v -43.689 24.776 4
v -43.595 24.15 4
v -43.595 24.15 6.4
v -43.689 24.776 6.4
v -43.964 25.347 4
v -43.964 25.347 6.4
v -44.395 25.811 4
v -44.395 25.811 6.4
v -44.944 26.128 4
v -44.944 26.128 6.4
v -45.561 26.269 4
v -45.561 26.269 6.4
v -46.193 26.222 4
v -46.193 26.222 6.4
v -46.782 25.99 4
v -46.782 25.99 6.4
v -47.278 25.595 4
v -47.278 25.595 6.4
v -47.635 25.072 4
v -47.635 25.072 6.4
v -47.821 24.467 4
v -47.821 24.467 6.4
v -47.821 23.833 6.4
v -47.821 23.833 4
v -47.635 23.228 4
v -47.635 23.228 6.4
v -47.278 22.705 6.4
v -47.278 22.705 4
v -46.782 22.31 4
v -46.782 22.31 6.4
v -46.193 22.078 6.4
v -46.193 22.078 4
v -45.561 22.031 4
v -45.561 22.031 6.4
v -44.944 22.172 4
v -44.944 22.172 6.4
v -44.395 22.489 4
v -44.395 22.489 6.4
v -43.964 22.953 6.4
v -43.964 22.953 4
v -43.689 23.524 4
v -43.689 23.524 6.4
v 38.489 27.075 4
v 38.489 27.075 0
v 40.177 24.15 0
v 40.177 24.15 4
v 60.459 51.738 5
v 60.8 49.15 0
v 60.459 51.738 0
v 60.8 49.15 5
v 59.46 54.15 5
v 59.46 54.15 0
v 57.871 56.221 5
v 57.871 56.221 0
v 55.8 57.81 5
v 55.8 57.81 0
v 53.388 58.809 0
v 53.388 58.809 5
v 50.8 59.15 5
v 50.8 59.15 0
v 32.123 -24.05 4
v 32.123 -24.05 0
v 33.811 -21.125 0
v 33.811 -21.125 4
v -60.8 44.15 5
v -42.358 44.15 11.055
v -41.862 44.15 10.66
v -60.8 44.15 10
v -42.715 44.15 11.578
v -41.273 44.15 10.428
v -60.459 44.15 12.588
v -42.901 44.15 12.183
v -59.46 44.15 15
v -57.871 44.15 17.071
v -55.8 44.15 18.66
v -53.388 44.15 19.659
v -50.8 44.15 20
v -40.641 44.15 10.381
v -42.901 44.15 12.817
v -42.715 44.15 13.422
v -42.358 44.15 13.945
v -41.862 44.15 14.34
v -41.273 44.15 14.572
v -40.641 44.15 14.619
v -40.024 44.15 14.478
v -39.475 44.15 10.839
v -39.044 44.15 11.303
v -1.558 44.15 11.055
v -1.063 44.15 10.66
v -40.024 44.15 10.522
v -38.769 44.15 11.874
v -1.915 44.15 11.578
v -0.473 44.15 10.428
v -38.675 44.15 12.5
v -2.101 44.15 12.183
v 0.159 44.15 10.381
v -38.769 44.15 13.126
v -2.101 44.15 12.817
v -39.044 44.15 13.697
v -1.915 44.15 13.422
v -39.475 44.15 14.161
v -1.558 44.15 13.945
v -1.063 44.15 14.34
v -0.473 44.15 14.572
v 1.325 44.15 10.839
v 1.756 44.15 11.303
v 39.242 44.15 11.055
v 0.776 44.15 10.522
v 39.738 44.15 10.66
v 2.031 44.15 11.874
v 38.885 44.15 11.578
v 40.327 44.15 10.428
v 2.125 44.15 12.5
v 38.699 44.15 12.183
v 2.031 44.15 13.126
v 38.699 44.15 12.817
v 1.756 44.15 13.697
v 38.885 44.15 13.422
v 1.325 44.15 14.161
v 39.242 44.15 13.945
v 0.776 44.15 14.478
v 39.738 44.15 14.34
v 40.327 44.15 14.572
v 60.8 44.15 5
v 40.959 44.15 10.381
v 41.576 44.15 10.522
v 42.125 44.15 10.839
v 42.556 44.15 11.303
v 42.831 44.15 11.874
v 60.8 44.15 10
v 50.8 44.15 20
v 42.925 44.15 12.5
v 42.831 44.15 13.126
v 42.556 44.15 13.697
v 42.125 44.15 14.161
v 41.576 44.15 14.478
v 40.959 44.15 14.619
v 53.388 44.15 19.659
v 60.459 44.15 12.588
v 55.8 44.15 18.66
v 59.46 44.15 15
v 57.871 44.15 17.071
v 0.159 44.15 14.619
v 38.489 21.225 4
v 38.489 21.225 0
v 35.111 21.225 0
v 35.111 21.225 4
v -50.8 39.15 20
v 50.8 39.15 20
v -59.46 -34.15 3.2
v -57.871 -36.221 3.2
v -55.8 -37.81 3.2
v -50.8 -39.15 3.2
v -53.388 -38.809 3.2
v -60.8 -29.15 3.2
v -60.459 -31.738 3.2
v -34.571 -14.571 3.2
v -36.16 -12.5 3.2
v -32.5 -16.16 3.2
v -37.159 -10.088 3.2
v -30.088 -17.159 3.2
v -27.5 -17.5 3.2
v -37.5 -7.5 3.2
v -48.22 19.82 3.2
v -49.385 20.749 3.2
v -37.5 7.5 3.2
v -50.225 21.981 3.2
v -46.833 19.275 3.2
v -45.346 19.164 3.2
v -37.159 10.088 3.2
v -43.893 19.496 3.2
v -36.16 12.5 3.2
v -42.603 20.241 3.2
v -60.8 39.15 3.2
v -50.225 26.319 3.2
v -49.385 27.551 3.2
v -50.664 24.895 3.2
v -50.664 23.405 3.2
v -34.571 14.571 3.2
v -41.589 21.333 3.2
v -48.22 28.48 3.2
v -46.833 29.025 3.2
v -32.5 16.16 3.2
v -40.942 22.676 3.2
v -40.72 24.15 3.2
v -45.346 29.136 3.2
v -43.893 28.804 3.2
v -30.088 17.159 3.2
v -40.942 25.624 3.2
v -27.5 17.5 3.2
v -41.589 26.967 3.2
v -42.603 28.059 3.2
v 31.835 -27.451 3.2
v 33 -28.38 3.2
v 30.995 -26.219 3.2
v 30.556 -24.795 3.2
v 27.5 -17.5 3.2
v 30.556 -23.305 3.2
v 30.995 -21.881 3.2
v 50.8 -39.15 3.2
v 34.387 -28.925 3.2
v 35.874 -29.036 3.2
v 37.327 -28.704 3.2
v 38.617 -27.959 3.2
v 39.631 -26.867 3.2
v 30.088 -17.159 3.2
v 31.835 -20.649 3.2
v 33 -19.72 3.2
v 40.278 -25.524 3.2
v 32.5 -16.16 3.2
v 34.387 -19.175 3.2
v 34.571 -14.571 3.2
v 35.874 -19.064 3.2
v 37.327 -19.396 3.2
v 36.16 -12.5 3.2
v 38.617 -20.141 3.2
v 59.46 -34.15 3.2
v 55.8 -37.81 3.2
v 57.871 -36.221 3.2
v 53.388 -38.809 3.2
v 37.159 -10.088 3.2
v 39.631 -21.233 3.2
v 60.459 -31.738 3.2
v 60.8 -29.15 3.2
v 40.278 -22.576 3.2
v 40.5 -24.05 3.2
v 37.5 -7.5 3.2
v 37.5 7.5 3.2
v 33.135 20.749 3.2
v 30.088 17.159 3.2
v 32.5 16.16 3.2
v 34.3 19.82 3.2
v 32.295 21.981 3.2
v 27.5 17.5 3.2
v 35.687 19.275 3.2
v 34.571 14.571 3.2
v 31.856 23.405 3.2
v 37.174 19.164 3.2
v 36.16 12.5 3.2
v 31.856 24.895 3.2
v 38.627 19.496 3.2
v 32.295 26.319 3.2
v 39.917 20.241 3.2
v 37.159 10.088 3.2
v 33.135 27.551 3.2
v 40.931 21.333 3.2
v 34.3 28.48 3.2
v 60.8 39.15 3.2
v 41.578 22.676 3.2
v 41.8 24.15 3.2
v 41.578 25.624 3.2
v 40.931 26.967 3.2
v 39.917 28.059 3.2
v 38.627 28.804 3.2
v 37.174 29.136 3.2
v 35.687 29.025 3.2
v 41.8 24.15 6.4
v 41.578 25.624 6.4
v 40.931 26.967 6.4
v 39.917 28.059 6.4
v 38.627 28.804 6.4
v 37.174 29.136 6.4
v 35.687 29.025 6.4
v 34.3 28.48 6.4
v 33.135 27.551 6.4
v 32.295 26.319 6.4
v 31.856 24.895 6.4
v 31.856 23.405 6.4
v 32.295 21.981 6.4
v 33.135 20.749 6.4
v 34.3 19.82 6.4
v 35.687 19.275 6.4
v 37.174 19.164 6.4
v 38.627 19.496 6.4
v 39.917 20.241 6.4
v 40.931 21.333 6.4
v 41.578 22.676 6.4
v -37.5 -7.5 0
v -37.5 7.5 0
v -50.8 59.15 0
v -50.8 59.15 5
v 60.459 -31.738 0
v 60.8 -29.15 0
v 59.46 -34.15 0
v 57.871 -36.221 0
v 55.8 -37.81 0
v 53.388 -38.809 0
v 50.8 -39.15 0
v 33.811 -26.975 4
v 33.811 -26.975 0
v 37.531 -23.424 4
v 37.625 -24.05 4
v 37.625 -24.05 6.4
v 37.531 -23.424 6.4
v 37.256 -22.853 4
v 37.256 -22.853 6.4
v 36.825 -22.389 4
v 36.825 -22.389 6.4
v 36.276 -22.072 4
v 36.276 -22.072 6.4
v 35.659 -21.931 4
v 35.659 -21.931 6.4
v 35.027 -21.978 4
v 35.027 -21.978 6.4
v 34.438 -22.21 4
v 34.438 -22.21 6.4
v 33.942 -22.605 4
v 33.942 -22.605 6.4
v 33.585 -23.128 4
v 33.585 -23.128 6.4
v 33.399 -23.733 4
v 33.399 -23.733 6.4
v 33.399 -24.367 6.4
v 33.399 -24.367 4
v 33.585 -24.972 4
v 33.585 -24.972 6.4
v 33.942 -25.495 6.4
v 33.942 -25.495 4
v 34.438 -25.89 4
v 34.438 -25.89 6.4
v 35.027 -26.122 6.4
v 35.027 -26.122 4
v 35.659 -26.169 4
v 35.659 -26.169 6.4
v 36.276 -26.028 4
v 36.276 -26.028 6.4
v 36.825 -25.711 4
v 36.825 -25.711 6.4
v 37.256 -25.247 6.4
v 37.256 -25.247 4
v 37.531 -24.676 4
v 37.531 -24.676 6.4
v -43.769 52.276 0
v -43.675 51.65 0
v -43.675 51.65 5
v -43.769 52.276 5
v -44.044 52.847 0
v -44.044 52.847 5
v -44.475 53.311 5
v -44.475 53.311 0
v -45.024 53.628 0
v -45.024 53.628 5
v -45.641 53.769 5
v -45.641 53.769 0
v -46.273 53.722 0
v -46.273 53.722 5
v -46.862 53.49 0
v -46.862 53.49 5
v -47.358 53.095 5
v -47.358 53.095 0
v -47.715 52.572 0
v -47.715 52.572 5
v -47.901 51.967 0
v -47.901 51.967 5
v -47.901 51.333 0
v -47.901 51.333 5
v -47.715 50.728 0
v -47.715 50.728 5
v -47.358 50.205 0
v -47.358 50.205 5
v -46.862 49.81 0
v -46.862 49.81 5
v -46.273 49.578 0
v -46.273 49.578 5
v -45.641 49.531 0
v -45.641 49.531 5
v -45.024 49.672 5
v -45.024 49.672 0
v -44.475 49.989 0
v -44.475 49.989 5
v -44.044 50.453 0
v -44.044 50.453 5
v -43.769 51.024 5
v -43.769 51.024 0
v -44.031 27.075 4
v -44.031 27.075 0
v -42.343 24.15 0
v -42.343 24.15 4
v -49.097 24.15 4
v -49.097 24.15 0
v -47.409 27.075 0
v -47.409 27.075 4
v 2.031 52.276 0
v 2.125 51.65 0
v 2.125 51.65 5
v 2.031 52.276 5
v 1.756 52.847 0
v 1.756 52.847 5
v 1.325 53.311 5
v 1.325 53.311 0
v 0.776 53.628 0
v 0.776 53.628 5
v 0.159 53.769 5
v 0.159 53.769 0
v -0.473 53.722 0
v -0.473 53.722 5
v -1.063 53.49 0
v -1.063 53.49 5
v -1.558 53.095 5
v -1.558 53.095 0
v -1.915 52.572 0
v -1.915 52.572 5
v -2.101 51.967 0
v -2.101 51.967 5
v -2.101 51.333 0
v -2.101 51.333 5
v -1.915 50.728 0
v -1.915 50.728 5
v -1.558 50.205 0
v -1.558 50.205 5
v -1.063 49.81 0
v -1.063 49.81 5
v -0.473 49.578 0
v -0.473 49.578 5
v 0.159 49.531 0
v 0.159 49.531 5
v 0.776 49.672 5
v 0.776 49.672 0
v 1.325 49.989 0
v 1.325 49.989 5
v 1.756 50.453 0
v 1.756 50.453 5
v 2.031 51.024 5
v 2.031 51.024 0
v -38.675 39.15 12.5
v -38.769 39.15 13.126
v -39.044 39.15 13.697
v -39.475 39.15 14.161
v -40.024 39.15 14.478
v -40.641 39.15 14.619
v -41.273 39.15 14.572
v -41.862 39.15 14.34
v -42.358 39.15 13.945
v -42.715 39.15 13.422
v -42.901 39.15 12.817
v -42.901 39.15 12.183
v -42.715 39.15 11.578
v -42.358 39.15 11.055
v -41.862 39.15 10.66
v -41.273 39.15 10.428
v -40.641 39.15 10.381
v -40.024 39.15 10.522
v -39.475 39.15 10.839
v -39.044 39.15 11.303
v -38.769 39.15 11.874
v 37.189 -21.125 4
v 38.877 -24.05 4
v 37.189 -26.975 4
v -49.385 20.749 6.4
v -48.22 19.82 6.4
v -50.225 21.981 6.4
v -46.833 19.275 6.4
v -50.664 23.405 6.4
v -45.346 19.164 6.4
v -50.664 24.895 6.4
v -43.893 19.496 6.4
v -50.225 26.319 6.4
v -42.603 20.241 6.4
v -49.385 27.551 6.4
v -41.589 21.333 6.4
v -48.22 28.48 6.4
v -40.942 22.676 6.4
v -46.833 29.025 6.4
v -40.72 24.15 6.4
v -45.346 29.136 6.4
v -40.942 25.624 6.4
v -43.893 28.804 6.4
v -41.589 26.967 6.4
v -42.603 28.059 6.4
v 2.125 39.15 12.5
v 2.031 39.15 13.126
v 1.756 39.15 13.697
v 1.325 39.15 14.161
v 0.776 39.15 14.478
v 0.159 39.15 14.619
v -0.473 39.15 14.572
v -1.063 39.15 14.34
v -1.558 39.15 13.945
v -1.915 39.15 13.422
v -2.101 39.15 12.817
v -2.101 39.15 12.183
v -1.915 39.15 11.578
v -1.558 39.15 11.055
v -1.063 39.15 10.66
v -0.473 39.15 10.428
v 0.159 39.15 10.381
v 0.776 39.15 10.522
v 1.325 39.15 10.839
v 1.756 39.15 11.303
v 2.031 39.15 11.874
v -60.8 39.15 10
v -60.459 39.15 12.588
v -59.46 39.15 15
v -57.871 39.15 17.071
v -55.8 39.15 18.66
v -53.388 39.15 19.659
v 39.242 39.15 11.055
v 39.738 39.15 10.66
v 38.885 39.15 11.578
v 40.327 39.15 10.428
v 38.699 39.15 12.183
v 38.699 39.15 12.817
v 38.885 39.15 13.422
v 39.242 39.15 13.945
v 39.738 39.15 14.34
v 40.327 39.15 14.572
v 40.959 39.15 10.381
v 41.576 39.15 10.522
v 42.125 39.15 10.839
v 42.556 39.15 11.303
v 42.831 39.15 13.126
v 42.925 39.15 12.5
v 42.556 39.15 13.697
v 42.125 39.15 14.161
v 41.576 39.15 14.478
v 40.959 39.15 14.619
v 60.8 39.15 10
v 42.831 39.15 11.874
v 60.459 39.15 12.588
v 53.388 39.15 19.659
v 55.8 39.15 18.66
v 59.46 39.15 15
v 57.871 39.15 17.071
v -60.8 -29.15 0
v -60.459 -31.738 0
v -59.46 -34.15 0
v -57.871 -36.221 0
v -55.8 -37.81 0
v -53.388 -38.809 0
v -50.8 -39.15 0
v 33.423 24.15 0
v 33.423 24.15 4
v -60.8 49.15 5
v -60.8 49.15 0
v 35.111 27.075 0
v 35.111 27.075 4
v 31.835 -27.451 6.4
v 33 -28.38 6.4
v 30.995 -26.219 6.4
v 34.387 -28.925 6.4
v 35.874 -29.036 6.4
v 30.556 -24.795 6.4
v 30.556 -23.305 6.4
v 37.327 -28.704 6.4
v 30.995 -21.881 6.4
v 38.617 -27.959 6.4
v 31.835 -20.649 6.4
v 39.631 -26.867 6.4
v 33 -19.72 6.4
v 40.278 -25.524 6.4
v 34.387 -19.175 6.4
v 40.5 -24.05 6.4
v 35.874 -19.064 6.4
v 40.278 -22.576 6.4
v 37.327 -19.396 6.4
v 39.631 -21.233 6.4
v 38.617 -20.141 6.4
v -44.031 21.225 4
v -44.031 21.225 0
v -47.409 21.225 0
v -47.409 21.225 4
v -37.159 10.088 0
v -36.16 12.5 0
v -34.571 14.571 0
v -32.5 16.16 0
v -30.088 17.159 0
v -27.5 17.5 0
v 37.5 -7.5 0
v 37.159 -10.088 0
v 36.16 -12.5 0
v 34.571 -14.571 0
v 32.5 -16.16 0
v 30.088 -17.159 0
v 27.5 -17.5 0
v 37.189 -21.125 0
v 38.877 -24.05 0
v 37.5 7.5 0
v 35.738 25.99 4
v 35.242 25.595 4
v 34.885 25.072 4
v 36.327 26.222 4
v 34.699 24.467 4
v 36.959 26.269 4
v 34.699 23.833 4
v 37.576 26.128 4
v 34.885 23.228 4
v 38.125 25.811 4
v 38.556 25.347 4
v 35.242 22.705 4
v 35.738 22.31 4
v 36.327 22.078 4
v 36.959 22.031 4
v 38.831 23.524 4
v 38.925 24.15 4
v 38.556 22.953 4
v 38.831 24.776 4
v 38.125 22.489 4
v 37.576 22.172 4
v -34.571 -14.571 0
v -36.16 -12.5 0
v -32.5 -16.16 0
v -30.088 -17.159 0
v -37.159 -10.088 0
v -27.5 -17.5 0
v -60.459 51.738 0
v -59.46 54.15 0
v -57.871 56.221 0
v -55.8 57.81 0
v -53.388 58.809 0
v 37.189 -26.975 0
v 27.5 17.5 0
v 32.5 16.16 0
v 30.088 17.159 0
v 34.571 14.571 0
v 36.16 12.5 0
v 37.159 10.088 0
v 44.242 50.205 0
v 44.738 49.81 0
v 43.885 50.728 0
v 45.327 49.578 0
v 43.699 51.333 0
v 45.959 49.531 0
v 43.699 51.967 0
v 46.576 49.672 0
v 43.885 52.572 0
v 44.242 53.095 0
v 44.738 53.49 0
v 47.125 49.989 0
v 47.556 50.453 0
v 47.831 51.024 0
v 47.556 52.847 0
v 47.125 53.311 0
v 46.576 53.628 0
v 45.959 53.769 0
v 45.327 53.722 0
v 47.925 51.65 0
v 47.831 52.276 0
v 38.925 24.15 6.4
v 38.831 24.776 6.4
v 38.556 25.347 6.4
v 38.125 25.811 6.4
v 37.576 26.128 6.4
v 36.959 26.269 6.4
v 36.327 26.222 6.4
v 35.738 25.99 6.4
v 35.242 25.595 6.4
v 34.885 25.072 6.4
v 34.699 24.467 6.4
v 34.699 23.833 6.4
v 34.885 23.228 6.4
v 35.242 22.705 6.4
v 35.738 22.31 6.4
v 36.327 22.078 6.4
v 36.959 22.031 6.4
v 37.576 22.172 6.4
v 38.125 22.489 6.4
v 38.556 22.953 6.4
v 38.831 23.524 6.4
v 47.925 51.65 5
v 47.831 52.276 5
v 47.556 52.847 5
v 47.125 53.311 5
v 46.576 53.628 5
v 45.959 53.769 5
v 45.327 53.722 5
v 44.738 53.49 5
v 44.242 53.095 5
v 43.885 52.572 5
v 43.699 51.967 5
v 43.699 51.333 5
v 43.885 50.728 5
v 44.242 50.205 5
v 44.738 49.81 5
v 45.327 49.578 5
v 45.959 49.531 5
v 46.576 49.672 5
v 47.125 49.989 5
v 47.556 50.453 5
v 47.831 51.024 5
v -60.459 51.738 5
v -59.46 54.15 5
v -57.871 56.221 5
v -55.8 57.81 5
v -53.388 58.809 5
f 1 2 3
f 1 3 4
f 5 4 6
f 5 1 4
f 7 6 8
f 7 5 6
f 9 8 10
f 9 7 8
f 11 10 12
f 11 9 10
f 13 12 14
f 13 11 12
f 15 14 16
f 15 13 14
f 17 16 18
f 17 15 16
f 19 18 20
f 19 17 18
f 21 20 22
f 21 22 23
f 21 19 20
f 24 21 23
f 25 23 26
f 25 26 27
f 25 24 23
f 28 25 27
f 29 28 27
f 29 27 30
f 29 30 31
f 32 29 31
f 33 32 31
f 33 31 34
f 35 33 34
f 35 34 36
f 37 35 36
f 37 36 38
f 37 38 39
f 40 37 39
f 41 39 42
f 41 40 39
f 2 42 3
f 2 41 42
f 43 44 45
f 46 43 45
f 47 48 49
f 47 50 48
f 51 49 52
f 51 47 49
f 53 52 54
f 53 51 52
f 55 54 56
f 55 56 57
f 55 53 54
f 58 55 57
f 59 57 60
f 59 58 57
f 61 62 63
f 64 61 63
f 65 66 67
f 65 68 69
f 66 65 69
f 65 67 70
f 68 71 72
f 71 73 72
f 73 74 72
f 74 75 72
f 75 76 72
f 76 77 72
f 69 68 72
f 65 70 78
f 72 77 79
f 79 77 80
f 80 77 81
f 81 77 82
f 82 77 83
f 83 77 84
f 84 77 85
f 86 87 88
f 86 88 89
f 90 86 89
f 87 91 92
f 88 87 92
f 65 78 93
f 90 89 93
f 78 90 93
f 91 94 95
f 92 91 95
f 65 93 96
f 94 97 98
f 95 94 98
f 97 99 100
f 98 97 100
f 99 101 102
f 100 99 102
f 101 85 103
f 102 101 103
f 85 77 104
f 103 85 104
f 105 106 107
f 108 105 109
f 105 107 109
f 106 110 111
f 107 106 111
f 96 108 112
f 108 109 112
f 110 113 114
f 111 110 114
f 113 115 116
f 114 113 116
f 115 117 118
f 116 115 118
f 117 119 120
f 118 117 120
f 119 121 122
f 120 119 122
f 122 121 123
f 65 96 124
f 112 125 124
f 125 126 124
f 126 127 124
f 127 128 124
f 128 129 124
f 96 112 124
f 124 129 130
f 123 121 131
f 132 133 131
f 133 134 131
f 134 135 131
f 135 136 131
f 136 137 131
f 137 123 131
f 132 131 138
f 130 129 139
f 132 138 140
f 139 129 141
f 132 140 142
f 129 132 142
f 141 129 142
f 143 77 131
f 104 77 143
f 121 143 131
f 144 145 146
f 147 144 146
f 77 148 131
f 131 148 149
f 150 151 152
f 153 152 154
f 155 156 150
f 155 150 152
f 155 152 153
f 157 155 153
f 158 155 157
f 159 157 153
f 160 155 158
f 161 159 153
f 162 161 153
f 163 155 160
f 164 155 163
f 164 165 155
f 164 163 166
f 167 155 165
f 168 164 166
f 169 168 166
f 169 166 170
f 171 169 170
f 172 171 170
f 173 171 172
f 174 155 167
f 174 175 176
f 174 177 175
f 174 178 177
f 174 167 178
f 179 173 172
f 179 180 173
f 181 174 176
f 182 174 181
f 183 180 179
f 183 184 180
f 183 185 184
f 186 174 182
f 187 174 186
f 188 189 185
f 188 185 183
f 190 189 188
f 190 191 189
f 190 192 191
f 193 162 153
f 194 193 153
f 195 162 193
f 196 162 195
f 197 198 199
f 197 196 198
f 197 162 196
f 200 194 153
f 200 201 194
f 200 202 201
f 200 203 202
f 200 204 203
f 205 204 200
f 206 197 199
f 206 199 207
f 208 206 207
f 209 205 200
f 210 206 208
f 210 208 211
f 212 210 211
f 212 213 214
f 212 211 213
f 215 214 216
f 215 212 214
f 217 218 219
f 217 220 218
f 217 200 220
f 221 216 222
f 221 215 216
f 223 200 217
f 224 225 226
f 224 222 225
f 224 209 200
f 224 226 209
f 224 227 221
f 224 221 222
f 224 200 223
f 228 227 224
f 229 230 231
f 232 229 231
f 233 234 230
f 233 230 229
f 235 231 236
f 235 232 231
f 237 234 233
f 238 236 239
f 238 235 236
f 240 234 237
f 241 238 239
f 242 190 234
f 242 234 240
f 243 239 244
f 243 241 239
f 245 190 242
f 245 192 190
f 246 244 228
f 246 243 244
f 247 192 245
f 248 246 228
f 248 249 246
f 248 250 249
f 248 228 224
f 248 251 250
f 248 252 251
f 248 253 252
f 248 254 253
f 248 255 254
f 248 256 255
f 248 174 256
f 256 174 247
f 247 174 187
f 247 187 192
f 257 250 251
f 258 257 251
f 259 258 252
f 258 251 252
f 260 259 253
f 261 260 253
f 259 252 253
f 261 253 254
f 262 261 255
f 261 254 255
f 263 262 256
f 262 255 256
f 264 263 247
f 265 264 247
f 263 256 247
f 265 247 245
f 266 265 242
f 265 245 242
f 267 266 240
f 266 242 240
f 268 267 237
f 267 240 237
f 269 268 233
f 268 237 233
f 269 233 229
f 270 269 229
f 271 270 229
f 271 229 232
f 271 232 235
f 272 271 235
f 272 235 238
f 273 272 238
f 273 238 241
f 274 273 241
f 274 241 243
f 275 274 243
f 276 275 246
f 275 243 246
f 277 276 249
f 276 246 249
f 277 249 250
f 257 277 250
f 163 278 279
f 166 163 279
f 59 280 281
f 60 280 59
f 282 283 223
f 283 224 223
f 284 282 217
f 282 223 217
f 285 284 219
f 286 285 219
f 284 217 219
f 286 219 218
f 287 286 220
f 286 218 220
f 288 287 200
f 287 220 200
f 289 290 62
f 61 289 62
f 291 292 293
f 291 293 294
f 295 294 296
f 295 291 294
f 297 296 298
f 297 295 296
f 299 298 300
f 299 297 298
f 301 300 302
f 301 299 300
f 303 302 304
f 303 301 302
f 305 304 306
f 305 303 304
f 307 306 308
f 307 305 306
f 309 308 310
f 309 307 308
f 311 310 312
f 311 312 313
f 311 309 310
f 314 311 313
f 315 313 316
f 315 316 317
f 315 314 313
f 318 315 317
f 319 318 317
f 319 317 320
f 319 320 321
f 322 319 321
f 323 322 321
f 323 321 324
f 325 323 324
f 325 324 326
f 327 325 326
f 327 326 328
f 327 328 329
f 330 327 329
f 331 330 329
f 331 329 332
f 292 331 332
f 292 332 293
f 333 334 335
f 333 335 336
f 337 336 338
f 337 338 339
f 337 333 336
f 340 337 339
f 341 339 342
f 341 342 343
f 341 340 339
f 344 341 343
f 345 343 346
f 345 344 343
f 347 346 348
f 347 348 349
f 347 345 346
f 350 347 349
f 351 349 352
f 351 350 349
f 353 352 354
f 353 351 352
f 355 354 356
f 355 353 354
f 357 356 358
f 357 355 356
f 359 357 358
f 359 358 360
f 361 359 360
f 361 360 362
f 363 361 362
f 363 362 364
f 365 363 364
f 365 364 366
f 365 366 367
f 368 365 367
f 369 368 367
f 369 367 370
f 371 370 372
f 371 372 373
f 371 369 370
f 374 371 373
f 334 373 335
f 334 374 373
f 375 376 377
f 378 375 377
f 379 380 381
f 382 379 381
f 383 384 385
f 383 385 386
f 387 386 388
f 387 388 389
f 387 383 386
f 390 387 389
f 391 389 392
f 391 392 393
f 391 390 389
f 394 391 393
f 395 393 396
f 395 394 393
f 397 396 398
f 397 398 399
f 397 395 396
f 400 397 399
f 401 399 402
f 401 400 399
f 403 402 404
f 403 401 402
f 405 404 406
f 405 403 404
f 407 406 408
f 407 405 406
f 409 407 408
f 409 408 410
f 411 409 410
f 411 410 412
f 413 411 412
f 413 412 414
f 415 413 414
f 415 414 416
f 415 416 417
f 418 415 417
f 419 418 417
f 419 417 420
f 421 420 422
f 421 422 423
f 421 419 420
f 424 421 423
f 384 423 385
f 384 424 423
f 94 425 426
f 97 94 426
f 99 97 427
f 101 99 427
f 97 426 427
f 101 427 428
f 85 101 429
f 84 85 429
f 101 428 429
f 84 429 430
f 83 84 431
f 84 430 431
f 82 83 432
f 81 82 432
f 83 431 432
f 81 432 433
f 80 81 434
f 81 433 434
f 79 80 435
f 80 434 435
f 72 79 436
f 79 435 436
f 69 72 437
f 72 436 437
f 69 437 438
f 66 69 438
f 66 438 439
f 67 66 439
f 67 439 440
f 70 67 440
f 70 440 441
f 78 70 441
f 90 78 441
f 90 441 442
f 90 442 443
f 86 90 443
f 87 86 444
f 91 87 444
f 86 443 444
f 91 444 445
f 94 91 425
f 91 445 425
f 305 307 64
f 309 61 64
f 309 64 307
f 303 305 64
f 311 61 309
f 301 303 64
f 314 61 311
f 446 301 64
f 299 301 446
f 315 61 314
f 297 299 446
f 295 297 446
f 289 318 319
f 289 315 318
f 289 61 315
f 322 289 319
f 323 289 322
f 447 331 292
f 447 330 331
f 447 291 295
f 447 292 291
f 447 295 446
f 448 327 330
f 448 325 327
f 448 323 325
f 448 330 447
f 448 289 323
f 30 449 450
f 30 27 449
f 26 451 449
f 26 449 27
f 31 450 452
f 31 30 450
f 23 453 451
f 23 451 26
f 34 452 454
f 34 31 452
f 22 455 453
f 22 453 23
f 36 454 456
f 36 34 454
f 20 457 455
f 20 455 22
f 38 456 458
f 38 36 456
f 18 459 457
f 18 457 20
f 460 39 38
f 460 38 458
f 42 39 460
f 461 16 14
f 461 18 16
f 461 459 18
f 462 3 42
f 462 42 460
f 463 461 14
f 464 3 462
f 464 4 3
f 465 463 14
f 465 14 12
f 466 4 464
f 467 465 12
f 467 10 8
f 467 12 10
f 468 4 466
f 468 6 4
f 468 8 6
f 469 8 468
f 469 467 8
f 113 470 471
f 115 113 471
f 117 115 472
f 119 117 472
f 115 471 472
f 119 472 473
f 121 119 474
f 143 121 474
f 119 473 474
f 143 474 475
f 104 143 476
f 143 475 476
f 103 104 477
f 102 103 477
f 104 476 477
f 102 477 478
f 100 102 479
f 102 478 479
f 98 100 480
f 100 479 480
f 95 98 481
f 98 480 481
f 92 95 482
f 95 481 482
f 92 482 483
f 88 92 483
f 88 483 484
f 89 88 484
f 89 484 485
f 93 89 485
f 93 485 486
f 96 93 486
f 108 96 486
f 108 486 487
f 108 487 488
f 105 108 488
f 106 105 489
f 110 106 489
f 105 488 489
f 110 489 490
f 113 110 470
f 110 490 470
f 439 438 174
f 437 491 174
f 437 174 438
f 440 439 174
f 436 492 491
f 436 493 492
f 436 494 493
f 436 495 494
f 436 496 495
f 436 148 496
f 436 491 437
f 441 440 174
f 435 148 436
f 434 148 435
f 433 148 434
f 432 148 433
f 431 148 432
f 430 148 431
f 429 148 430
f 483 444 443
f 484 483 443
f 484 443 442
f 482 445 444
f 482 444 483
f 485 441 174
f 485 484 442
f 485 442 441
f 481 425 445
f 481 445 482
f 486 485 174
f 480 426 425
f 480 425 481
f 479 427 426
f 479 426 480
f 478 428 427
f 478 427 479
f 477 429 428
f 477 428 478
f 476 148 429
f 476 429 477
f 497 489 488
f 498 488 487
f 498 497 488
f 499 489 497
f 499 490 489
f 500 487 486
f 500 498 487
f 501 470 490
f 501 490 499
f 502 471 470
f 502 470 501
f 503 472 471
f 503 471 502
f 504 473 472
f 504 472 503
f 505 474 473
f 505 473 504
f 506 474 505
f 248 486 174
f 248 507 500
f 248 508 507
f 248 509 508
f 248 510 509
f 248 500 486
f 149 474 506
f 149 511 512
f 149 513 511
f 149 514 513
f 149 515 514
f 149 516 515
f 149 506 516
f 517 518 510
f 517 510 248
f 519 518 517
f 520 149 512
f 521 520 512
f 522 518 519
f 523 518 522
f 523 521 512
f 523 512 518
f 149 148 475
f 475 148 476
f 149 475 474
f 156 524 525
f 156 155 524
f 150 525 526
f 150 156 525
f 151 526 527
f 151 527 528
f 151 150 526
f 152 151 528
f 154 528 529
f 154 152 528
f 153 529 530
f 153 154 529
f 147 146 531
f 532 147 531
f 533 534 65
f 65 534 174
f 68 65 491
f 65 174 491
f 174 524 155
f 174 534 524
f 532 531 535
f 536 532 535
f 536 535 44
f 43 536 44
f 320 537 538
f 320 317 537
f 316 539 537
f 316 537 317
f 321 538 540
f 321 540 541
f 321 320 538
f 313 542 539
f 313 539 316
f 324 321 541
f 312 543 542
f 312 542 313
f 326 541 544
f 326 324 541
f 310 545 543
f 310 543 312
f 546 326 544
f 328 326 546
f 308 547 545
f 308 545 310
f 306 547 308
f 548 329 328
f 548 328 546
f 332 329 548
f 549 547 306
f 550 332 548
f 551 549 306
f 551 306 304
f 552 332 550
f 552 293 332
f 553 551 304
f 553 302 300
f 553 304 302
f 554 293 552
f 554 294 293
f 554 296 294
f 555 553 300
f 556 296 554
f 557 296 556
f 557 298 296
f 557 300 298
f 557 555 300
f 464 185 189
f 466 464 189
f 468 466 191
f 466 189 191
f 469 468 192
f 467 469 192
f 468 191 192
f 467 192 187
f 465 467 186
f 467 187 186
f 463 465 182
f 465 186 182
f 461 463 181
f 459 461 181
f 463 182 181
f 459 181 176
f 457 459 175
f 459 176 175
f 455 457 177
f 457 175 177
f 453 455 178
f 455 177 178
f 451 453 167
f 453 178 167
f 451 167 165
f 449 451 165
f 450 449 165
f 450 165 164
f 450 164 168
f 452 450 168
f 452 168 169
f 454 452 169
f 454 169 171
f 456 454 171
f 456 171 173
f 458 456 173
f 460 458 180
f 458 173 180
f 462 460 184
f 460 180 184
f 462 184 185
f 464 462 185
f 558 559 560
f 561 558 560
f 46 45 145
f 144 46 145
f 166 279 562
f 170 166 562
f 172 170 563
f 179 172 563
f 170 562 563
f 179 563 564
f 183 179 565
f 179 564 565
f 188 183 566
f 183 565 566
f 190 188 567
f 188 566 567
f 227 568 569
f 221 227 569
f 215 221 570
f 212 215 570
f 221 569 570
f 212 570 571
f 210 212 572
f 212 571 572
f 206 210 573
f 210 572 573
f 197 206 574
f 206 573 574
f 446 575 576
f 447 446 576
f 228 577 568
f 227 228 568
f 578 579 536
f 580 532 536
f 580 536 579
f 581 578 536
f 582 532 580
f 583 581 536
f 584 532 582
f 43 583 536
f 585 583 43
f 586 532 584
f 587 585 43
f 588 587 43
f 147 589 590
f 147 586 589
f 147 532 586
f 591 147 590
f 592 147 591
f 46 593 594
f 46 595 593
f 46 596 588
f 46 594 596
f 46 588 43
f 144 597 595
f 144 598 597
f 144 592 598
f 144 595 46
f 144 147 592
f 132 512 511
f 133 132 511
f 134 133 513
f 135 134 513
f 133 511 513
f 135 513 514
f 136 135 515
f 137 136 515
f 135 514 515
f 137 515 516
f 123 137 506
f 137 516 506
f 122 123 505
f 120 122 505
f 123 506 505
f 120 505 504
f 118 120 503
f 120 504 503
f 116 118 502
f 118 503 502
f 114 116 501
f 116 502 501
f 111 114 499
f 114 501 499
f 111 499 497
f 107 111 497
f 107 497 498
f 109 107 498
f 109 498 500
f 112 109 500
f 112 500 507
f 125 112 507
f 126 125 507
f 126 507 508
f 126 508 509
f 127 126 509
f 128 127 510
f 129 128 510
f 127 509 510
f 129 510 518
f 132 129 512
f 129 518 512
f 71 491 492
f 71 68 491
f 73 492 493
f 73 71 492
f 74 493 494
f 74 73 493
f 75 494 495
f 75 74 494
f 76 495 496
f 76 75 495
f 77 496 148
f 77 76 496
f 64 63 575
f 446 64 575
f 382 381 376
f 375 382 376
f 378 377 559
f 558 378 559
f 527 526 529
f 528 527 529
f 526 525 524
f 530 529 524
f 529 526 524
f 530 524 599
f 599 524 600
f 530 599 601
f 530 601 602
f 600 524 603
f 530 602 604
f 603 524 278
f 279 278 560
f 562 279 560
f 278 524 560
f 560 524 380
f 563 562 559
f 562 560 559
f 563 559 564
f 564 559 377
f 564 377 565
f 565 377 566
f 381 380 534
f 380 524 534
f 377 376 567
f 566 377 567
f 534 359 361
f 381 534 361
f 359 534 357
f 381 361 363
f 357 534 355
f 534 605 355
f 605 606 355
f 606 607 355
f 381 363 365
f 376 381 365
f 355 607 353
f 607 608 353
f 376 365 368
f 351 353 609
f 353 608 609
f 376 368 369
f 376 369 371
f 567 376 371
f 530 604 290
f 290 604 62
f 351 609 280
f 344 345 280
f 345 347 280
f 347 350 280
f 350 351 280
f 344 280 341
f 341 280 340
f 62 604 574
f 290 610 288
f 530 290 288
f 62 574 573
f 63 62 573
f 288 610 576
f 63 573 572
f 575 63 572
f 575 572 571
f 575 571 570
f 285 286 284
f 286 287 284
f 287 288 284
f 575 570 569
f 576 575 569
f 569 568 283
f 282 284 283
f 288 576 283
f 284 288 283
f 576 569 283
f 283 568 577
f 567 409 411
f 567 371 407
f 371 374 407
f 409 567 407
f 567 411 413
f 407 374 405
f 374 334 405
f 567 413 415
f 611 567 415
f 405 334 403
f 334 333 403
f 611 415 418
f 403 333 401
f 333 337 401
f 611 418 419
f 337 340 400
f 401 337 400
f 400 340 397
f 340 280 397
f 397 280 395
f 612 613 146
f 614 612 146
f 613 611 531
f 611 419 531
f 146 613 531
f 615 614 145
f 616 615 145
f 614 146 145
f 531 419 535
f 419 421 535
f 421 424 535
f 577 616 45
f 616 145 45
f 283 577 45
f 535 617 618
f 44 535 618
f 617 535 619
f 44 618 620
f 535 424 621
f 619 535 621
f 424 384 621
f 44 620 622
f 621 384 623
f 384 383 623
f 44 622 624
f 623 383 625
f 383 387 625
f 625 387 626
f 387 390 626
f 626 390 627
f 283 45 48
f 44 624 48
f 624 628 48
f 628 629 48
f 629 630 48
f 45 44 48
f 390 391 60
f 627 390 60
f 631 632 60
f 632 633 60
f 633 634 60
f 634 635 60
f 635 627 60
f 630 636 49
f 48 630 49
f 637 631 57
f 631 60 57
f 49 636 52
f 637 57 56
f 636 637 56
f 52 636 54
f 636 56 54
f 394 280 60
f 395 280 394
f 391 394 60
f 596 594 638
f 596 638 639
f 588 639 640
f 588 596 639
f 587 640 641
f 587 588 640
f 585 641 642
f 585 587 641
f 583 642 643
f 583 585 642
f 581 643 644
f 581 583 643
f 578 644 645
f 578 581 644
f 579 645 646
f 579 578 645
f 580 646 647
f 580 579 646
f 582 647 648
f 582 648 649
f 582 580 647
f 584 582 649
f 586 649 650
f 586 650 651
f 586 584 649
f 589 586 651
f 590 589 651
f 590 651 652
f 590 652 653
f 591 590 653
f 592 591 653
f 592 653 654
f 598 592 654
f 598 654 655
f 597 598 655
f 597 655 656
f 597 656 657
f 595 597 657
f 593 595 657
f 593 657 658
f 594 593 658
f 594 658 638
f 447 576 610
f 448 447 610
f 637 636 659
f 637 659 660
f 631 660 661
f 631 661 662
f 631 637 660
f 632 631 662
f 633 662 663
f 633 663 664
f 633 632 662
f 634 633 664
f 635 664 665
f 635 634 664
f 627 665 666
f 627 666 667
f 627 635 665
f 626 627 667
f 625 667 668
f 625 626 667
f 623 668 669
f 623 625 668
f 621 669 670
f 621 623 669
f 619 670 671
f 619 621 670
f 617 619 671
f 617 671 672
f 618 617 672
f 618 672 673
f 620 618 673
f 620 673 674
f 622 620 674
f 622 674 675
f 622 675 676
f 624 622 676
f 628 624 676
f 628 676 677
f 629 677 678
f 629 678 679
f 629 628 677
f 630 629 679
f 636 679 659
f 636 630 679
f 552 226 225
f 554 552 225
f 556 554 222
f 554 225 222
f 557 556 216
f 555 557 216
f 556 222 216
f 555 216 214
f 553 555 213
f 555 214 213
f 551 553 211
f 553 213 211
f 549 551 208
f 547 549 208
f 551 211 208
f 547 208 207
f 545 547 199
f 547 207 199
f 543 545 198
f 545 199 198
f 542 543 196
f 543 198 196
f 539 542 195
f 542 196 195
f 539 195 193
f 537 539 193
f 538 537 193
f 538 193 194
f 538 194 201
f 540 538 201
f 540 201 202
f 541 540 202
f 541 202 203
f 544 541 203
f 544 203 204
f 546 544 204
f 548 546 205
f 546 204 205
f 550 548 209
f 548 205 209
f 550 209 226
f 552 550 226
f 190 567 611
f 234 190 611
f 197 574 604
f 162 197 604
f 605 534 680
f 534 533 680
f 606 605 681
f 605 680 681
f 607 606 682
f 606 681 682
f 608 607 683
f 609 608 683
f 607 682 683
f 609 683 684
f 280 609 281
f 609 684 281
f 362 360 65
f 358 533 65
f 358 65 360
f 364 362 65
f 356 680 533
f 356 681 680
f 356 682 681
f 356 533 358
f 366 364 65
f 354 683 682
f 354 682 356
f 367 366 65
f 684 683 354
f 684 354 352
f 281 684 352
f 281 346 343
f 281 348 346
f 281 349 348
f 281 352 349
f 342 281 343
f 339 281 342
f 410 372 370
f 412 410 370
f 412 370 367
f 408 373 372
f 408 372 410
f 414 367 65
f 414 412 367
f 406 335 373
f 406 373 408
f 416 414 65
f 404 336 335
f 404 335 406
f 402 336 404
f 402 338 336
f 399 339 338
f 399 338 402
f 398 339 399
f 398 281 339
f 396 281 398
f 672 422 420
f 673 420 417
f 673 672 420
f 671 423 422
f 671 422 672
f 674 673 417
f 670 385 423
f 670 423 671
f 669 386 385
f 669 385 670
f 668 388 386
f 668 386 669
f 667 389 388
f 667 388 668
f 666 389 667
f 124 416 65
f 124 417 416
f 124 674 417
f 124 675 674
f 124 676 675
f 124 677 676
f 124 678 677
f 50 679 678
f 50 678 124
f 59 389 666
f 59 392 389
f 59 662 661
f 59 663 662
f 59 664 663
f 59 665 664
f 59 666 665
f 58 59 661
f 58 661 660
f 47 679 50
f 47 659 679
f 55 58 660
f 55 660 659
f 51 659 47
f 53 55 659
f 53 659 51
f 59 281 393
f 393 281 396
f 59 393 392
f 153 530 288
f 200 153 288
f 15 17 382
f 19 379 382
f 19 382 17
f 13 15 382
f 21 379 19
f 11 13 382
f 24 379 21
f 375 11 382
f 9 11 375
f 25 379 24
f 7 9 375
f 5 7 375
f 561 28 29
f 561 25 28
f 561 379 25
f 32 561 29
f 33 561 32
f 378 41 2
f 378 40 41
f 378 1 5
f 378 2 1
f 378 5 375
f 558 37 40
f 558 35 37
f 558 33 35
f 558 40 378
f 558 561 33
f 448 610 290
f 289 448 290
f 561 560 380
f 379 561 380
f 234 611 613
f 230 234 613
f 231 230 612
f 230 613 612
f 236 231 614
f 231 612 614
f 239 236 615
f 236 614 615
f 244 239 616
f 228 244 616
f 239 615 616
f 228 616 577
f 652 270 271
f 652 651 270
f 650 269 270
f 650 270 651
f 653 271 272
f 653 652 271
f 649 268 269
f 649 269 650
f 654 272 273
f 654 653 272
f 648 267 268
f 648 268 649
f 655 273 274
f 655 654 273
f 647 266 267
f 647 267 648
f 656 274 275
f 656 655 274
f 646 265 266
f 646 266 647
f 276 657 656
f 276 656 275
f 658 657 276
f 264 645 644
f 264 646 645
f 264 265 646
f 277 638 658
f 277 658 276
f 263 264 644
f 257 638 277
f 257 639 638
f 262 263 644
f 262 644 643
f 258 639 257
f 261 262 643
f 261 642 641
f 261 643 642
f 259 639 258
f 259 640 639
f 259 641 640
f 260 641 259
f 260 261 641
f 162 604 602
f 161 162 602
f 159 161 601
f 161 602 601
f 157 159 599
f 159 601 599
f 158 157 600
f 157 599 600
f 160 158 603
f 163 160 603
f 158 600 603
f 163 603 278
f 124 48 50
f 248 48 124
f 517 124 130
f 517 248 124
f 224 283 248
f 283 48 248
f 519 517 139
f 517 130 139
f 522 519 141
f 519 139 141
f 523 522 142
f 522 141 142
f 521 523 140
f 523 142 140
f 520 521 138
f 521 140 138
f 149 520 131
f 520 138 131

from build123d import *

# Parameters (mm, degrees)
F0_W     = 121.6
F0_H     = 78.3
F0_R     = 2.125
F1_DEPTH = 3.2
F2_R     = 5
F2_R_2   = 2.125
F3_DEPTH = 3.2
F5_DEPTH = 4
F6_W     = 121.6
F6_H     = 20
F6_R     = 2.125
F7_DEPTH = 5
F8_W     = 121.6
F8_H     = 15
F8_R     = 2.125
F9_DEPTH = 5
F10_R    = 10


with BuildPart() as f1:
    # F0 (on Top) → F1 (new body)
    with BuildSketch(Plane.XY):
        Rectangle(F0_W, F0_H)
        with Locations((35.5, -24.05)):
            Circle(F0_R, mode=Mode.SUBTRACT)
        with BuildLine():
            ThreePointArc((37.5, -7.5), (34.571068, -14.571068), (27.5, -17.5))
            Line((27.5, -17.5), (-27.5, -17.5))
            ThreePointArc((-27.5, -17.5), (-34.571068, -14.571068), (-37.5, -7.5))
            Line((-37.5, -7.5), (-37.5, 7.5))
            ThreePointArc((-37.5, 7.5), (-34.571068, 14.571068), (-27.5, 17.5))
            Line((-27.5, 17.5), (27.5, 17.5))
            ThreePointArc((27.5, 17.5), (34.571068, 14.571068), (37.5, 7.5))
            Line((37.5, 7.5), (37.5, -7.5))
        make_face(mode=Mode.SUBTRACT)
        with Locations((-45.72, 24.15)):
            Circle(F0_R, mode=Mode.SUBTRACT)
        with Locations((36.8, 24.15)):
            Circle(F0_R, mode=Mode.SUBTRACT)
    extrude(amount=F1_DEPTH)

    # F2 (on face) → F3 (join)
    with BuildSketch(Plane.XY.offset(3.2)):
        with Locations((-45.72, 24.15)):
            Circle(F2_R)
        with Locations((-45.72, 24.15)):
            Circle(F2_R_2, mode=Mode.SUBTRACT)
        with Locations((36.8, 24.15)):
            Circle(F2_R)
        with Locations((36.8, 24.15)):
            Circle(F2_R_2, mode=Mode.SUBTRACT)
        with Locations((35.5, -24.05)):
            Circle(F2_R)
        with Locations((35.5, -24.05)):
            Circle(F2_R_2, mode=Mode.SUBTRACT)
    extrude(amount=F3_DEPTH)

    # F4 (on face) → F5 (cut)
    with BuildSketch(Plane(origin=(0, 0, 0), x_dir=(1, 0, 0), z_dir=(0, 0, -1))):
        Polygon((-44.03125, -21.225), (-47.40875, -21.225), (-49.097499, -24.15), (-47.40875, -27.075), (-44.03125, -27.075), (-42.342501, -24.15), align=None)
        Polygon((38.48875, -21.225), (35.11125, -21.225), (33.422501, -24.15), (35.11125, -27.075), (38.48875, -27.075), (40.177499, -24.15), align=None)
        Polygon((33.81125, 21.125), (37.18875, 21.125), (38.877499, 24.05), (37.18875, 26.975), (33.81125, 26.975), (32.122501, 24.05), align=None)
    extrude(amount=-F5_DEPTH, mode=Mode.SUBTRACT)

    # F6 (on Top) → F7 (join)
    with BuildSketch(Plane.XY):
        with Locations((0, 49.15)):
            Rectangle(F6_W, F6_H)
        with Locations((-45.8, 51.65)):
            Circle(F6_R, mode=Mode.SUBTRACT)
        with Locations((0, 51.65)):
            Circle(F6_R, mode=Mode.SUBTRACT)
        with Locations((45.8, 51.65)):
            Circle(F6_R, mode=Mode.SUBTRACT)
    extrude(amount=F7_DEPTH)

    # F8 (on face) → F9 (join)
    with BuildSketch(Plane.XZ.offset(-39.15)):
        with Locations((0, 12.5)):
            Rectangle(F8_W, F8_H)
        with Locations((-40.8, 12.5)):
            Circle(F8_R, mode=Mode.SUBTRACT)
        with Locations((0, 12.5)):
            Circle(F8_R, mode=Mode.SUBTRACT)
        with Locations((40.8, 12.5)):
            Circle(F8_R, mode=Mode.SUBTRACT)
    extrude(amount=-F9_DEPTH)

    # F10
    f10_edges = [f1.edges().sort_by_distance(p)[0] for p in [
        (60.8, -39.15, 1.6),
        (-60.8, -39.15, 1.6),
        (-60.8, 59.15, 2.5),
        (-60.8, 41.65, 20),
        (60.8, 41.65, 20),
        (60.8, 59.15, 2.5),
    ]]
    fillet(f10_edges, radius=F10_R)


solid = f1.part
